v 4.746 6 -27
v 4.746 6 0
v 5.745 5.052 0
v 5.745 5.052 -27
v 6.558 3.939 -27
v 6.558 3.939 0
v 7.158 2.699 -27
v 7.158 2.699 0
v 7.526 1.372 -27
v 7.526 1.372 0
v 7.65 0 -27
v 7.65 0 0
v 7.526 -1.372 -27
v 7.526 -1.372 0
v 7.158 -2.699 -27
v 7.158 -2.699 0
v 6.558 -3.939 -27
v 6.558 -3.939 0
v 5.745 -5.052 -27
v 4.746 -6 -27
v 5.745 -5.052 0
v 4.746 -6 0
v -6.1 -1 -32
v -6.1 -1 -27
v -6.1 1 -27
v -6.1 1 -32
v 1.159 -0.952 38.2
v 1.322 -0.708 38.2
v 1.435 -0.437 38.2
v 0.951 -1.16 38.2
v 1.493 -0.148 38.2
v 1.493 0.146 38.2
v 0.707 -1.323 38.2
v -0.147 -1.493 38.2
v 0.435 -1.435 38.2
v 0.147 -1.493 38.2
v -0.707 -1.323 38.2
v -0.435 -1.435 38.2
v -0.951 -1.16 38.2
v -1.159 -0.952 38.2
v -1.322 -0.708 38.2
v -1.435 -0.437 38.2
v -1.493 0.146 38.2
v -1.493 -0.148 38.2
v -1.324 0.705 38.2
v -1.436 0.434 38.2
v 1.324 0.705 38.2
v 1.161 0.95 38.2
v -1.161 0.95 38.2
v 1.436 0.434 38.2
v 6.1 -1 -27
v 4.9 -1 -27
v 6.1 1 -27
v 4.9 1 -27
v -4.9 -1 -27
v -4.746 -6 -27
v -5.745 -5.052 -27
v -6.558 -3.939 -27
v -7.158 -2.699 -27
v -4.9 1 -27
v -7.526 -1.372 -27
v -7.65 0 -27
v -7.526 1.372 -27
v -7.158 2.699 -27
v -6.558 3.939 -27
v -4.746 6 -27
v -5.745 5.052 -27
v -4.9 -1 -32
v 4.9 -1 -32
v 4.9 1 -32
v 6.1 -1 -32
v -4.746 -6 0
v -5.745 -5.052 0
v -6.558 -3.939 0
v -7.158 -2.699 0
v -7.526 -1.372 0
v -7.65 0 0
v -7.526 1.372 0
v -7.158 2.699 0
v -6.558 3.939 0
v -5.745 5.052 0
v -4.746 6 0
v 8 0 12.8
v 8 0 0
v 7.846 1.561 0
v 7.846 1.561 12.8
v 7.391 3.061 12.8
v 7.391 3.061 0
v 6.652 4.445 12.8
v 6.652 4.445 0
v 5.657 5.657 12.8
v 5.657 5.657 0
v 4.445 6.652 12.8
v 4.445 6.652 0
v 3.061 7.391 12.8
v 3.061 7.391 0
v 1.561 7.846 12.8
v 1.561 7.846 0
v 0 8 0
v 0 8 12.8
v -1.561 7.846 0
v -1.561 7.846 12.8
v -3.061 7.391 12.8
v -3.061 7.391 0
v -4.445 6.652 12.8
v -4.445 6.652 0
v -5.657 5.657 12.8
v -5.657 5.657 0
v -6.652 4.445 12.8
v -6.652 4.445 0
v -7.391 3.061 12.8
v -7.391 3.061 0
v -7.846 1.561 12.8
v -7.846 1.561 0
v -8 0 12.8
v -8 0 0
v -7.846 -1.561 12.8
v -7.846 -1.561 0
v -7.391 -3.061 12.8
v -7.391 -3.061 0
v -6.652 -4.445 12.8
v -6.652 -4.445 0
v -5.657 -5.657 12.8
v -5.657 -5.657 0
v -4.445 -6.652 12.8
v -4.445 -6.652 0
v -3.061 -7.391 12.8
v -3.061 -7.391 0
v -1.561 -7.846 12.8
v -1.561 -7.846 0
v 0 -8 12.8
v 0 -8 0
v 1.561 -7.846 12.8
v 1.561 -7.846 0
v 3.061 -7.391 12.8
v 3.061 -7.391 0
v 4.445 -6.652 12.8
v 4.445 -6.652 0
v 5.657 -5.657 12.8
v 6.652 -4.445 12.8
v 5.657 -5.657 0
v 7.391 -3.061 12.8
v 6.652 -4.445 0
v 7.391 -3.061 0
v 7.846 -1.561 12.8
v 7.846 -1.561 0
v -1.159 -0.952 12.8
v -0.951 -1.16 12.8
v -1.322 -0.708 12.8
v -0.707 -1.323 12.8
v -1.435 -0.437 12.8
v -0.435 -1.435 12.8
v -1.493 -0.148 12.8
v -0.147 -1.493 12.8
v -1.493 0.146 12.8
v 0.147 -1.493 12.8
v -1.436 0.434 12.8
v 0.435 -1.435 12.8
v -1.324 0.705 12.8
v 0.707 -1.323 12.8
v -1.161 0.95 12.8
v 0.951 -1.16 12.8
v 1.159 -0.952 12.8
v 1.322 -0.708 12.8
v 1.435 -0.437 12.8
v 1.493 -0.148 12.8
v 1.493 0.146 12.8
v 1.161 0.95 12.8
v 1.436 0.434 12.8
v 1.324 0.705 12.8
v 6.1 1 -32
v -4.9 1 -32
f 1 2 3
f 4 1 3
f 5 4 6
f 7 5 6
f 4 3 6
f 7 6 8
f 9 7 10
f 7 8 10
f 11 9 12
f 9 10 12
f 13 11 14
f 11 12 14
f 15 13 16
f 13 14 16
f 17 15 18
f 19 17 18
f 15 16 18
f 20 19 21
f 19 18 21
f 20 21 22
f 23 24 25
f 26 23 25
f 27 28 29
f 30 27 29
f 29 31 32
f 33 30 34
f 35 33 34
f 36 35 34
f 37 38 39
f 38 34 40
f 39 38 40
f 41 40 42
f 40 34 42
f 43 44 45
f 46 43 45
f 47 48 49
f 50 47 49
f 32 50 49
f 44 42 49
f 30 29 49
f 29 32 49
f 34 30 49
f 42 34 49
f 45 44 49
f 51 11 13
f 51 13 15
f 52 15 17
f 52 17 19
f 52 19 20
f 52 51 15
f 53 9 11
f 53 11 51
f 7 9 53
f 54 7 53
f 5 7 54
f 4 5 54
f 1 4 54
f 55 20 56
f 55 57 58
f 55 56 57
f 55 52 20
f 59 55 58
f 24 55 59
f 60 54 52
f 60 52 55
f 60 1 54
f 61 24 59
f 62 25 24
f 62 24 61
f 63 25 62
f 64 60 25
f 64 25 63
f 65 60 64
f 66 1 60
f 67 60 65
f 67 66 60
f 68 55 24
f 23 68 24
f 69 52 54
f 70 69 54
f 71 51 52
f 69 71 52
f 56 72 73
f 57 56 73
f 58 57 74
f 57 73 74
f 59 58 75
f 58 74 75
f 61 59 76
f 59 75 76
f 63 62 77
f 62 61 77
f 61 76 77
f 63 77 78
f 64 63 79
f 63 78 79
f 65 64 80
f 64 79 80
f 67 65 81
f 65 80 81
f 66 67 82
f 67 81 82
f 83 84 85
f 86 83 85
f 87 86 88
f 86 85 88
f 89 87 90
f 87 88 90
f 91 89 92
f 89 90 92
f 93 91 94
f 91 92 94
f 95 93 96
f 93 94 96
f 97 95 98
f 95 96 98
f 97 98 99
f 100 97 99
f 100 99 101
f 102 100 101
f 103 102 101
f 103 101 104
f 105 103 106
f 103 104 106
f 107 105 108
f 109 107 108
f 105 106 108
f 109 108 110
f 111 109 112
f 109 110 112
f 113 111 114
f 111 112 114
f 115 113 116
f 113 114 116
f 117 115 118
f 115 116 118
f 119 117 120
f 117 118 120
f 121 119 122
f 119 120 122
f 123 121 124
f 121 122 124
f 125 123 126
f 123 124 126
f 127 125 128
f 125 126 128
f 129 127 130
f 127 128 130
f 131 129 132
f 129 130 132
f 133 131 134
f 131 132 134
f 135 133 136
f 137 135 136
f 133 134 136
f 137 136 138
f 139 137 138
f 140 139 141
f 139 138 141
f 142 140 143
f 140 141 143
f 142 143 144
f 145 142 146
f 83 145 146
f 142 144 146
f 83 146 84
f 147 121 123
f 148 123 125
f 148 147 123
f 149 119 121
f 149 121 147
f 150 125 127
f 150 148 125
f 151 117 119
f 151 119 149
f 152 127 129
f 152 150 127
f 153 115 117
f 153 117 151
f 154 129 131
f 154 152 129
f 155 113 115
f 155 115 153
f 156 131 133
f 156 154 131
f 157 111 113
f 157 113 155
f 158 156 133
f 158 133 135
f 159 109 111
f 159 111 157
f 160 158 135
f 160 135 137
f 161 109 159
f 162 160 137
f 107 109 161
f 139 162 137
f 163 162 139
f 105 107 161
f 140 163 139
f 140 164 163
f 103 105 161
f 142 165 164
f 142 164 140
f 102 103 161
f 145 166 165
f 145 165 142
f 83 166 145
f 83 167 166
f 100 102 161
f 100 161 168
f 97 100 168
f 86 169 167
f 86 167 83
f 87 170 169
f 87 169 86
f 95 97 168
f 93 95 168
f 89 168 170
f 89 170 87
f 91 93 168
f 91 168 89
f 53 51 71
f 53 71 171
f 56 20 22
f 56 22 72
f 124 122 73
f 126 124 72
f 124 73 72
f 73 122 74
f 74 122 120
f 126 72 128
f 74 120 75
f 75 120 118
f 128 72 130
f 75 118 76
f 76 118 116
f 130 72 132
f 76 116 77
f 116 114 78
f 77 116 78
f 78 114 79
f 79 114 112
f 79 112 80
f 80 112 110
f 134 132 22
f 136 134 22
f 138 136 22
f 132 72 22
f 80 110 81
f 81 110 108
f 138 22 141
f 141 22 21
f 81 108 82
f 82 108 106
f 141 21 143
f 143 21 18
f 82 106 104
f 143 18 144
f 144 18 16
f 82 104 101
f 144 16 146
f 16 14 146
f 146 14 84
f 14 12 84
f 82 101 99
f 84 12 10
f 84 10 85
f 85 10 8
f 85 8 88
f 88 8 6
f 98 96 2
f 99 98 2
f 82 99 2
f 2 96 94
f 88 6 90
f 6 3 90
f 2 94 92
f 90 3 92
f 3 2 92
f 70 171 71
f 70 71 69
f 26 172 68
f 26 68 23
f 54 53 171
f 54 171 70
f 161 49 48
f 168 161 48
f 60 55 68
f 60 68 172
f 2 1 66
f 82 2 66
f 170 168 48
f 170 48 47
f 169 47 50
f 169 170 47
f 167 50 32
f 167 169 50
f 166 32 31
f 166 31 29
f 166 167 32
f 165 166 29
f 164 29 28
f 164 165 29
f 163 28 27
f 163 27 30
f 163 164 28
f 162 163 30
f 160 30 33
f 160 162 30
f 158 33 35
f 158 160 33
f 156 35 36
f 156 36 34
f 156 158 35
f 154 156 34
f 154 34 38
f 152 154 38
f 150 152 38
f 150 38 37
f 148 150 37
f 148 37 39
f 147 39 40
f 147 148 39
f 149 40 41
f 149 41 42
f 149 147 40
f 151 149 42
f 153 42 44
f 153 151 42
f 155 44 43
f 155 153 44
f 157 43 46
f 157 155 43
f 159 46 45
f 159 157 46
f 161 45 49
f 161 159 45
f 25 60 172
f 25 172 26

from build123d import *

# Parameters (mm, degrees)
SKETCH1_R           = 8
BOSS_EXTRUDE1_DEPTH = 12.8
SKETCH3_R           = 7.65
BOSS_EXTRUDE3_DEPTH = 27
CUT_EXTRUDE1_DEPTH  = 27
BOSS_EXTRUDE4_DEPTH = 25.4
SKETCH8_W           = 1.2
SKETCH8_H           = 2
BOSS_EXTRUDE5_DEPTH = 5


with BuildPart() as part:
    # Sketch1 → Boss-Extrude1 (new body)
    with BuildSketch(Plane.XY):
        Circle(SKETCH1_R)
    extrude(amount=BOSS_EXTRUDE1_DEPTH)

    # Sketch3 → Boss-Extrude3 (add)
    with BuildSketch(Plane(origin=(0, 0, 0), x_dir=(-1, 0, 0), z_dir=(0, 0, -1))):
        Circle(SKETCH3_R)
    extrude(amount=BOSS_EXTRUDE3_DEPTH)

    # Sketch4 → Cut-Extrude1 (cut)
    with BuildSketch(Plane(origin=(0, 0, -27), x_dir=(-1, 0, 0), z_dir=(0, 0, -1))):
        with BuildLine():
            Line((-4.745787606, -6), (4.745787606, -6))
            ThreePointArc((4.745787606, -6), (0, -7.65), (-4.745787606, -6))
        make_face()
        with BuildLine():
            Line((-4.745787606, 6), (4.745787606, 6))
            ThreePointArc((4.745787606, 6), (0, 7.65), (-4.745787606, 6))
        make_face()
    extrude(amount=-CUT_EXTRUDE1_DEPTH, mode=Mode.SUBTRACT)

    # Sketch7 → Boss-Extrude4 (add)
    with BuildSketch(Plane.XY.offset(12.8)):
        with BuildLine():
            Line((-1.160818677, 0.95), (1.160818677, 0.95))
            ThreePointArc((1.160818677, 0.95), (0, -1.5), (-1.160818677, 0.95))
        make_face()
    extrude(amount=BOSS_EXTRUDE4_DEPTH)

    # Sketch8 → Boss-Extrude5 (add)
    with BuildSketch(Plane(origin=(0, 0, -27), x_dir=(-1, 0, 0), z_dir=(0, 0, -1))):
        with Locations((-5.5, 0)):
            Rectangle(SKETCH8_W, SKETCH8_H)
        with Locations((5.5, 0)):
            Rectangle(SKETCH8_W, SKETCH8_H)
    extrude(amount=BOSS_EXTRUDE5_DEPTH)


solid = part.part
